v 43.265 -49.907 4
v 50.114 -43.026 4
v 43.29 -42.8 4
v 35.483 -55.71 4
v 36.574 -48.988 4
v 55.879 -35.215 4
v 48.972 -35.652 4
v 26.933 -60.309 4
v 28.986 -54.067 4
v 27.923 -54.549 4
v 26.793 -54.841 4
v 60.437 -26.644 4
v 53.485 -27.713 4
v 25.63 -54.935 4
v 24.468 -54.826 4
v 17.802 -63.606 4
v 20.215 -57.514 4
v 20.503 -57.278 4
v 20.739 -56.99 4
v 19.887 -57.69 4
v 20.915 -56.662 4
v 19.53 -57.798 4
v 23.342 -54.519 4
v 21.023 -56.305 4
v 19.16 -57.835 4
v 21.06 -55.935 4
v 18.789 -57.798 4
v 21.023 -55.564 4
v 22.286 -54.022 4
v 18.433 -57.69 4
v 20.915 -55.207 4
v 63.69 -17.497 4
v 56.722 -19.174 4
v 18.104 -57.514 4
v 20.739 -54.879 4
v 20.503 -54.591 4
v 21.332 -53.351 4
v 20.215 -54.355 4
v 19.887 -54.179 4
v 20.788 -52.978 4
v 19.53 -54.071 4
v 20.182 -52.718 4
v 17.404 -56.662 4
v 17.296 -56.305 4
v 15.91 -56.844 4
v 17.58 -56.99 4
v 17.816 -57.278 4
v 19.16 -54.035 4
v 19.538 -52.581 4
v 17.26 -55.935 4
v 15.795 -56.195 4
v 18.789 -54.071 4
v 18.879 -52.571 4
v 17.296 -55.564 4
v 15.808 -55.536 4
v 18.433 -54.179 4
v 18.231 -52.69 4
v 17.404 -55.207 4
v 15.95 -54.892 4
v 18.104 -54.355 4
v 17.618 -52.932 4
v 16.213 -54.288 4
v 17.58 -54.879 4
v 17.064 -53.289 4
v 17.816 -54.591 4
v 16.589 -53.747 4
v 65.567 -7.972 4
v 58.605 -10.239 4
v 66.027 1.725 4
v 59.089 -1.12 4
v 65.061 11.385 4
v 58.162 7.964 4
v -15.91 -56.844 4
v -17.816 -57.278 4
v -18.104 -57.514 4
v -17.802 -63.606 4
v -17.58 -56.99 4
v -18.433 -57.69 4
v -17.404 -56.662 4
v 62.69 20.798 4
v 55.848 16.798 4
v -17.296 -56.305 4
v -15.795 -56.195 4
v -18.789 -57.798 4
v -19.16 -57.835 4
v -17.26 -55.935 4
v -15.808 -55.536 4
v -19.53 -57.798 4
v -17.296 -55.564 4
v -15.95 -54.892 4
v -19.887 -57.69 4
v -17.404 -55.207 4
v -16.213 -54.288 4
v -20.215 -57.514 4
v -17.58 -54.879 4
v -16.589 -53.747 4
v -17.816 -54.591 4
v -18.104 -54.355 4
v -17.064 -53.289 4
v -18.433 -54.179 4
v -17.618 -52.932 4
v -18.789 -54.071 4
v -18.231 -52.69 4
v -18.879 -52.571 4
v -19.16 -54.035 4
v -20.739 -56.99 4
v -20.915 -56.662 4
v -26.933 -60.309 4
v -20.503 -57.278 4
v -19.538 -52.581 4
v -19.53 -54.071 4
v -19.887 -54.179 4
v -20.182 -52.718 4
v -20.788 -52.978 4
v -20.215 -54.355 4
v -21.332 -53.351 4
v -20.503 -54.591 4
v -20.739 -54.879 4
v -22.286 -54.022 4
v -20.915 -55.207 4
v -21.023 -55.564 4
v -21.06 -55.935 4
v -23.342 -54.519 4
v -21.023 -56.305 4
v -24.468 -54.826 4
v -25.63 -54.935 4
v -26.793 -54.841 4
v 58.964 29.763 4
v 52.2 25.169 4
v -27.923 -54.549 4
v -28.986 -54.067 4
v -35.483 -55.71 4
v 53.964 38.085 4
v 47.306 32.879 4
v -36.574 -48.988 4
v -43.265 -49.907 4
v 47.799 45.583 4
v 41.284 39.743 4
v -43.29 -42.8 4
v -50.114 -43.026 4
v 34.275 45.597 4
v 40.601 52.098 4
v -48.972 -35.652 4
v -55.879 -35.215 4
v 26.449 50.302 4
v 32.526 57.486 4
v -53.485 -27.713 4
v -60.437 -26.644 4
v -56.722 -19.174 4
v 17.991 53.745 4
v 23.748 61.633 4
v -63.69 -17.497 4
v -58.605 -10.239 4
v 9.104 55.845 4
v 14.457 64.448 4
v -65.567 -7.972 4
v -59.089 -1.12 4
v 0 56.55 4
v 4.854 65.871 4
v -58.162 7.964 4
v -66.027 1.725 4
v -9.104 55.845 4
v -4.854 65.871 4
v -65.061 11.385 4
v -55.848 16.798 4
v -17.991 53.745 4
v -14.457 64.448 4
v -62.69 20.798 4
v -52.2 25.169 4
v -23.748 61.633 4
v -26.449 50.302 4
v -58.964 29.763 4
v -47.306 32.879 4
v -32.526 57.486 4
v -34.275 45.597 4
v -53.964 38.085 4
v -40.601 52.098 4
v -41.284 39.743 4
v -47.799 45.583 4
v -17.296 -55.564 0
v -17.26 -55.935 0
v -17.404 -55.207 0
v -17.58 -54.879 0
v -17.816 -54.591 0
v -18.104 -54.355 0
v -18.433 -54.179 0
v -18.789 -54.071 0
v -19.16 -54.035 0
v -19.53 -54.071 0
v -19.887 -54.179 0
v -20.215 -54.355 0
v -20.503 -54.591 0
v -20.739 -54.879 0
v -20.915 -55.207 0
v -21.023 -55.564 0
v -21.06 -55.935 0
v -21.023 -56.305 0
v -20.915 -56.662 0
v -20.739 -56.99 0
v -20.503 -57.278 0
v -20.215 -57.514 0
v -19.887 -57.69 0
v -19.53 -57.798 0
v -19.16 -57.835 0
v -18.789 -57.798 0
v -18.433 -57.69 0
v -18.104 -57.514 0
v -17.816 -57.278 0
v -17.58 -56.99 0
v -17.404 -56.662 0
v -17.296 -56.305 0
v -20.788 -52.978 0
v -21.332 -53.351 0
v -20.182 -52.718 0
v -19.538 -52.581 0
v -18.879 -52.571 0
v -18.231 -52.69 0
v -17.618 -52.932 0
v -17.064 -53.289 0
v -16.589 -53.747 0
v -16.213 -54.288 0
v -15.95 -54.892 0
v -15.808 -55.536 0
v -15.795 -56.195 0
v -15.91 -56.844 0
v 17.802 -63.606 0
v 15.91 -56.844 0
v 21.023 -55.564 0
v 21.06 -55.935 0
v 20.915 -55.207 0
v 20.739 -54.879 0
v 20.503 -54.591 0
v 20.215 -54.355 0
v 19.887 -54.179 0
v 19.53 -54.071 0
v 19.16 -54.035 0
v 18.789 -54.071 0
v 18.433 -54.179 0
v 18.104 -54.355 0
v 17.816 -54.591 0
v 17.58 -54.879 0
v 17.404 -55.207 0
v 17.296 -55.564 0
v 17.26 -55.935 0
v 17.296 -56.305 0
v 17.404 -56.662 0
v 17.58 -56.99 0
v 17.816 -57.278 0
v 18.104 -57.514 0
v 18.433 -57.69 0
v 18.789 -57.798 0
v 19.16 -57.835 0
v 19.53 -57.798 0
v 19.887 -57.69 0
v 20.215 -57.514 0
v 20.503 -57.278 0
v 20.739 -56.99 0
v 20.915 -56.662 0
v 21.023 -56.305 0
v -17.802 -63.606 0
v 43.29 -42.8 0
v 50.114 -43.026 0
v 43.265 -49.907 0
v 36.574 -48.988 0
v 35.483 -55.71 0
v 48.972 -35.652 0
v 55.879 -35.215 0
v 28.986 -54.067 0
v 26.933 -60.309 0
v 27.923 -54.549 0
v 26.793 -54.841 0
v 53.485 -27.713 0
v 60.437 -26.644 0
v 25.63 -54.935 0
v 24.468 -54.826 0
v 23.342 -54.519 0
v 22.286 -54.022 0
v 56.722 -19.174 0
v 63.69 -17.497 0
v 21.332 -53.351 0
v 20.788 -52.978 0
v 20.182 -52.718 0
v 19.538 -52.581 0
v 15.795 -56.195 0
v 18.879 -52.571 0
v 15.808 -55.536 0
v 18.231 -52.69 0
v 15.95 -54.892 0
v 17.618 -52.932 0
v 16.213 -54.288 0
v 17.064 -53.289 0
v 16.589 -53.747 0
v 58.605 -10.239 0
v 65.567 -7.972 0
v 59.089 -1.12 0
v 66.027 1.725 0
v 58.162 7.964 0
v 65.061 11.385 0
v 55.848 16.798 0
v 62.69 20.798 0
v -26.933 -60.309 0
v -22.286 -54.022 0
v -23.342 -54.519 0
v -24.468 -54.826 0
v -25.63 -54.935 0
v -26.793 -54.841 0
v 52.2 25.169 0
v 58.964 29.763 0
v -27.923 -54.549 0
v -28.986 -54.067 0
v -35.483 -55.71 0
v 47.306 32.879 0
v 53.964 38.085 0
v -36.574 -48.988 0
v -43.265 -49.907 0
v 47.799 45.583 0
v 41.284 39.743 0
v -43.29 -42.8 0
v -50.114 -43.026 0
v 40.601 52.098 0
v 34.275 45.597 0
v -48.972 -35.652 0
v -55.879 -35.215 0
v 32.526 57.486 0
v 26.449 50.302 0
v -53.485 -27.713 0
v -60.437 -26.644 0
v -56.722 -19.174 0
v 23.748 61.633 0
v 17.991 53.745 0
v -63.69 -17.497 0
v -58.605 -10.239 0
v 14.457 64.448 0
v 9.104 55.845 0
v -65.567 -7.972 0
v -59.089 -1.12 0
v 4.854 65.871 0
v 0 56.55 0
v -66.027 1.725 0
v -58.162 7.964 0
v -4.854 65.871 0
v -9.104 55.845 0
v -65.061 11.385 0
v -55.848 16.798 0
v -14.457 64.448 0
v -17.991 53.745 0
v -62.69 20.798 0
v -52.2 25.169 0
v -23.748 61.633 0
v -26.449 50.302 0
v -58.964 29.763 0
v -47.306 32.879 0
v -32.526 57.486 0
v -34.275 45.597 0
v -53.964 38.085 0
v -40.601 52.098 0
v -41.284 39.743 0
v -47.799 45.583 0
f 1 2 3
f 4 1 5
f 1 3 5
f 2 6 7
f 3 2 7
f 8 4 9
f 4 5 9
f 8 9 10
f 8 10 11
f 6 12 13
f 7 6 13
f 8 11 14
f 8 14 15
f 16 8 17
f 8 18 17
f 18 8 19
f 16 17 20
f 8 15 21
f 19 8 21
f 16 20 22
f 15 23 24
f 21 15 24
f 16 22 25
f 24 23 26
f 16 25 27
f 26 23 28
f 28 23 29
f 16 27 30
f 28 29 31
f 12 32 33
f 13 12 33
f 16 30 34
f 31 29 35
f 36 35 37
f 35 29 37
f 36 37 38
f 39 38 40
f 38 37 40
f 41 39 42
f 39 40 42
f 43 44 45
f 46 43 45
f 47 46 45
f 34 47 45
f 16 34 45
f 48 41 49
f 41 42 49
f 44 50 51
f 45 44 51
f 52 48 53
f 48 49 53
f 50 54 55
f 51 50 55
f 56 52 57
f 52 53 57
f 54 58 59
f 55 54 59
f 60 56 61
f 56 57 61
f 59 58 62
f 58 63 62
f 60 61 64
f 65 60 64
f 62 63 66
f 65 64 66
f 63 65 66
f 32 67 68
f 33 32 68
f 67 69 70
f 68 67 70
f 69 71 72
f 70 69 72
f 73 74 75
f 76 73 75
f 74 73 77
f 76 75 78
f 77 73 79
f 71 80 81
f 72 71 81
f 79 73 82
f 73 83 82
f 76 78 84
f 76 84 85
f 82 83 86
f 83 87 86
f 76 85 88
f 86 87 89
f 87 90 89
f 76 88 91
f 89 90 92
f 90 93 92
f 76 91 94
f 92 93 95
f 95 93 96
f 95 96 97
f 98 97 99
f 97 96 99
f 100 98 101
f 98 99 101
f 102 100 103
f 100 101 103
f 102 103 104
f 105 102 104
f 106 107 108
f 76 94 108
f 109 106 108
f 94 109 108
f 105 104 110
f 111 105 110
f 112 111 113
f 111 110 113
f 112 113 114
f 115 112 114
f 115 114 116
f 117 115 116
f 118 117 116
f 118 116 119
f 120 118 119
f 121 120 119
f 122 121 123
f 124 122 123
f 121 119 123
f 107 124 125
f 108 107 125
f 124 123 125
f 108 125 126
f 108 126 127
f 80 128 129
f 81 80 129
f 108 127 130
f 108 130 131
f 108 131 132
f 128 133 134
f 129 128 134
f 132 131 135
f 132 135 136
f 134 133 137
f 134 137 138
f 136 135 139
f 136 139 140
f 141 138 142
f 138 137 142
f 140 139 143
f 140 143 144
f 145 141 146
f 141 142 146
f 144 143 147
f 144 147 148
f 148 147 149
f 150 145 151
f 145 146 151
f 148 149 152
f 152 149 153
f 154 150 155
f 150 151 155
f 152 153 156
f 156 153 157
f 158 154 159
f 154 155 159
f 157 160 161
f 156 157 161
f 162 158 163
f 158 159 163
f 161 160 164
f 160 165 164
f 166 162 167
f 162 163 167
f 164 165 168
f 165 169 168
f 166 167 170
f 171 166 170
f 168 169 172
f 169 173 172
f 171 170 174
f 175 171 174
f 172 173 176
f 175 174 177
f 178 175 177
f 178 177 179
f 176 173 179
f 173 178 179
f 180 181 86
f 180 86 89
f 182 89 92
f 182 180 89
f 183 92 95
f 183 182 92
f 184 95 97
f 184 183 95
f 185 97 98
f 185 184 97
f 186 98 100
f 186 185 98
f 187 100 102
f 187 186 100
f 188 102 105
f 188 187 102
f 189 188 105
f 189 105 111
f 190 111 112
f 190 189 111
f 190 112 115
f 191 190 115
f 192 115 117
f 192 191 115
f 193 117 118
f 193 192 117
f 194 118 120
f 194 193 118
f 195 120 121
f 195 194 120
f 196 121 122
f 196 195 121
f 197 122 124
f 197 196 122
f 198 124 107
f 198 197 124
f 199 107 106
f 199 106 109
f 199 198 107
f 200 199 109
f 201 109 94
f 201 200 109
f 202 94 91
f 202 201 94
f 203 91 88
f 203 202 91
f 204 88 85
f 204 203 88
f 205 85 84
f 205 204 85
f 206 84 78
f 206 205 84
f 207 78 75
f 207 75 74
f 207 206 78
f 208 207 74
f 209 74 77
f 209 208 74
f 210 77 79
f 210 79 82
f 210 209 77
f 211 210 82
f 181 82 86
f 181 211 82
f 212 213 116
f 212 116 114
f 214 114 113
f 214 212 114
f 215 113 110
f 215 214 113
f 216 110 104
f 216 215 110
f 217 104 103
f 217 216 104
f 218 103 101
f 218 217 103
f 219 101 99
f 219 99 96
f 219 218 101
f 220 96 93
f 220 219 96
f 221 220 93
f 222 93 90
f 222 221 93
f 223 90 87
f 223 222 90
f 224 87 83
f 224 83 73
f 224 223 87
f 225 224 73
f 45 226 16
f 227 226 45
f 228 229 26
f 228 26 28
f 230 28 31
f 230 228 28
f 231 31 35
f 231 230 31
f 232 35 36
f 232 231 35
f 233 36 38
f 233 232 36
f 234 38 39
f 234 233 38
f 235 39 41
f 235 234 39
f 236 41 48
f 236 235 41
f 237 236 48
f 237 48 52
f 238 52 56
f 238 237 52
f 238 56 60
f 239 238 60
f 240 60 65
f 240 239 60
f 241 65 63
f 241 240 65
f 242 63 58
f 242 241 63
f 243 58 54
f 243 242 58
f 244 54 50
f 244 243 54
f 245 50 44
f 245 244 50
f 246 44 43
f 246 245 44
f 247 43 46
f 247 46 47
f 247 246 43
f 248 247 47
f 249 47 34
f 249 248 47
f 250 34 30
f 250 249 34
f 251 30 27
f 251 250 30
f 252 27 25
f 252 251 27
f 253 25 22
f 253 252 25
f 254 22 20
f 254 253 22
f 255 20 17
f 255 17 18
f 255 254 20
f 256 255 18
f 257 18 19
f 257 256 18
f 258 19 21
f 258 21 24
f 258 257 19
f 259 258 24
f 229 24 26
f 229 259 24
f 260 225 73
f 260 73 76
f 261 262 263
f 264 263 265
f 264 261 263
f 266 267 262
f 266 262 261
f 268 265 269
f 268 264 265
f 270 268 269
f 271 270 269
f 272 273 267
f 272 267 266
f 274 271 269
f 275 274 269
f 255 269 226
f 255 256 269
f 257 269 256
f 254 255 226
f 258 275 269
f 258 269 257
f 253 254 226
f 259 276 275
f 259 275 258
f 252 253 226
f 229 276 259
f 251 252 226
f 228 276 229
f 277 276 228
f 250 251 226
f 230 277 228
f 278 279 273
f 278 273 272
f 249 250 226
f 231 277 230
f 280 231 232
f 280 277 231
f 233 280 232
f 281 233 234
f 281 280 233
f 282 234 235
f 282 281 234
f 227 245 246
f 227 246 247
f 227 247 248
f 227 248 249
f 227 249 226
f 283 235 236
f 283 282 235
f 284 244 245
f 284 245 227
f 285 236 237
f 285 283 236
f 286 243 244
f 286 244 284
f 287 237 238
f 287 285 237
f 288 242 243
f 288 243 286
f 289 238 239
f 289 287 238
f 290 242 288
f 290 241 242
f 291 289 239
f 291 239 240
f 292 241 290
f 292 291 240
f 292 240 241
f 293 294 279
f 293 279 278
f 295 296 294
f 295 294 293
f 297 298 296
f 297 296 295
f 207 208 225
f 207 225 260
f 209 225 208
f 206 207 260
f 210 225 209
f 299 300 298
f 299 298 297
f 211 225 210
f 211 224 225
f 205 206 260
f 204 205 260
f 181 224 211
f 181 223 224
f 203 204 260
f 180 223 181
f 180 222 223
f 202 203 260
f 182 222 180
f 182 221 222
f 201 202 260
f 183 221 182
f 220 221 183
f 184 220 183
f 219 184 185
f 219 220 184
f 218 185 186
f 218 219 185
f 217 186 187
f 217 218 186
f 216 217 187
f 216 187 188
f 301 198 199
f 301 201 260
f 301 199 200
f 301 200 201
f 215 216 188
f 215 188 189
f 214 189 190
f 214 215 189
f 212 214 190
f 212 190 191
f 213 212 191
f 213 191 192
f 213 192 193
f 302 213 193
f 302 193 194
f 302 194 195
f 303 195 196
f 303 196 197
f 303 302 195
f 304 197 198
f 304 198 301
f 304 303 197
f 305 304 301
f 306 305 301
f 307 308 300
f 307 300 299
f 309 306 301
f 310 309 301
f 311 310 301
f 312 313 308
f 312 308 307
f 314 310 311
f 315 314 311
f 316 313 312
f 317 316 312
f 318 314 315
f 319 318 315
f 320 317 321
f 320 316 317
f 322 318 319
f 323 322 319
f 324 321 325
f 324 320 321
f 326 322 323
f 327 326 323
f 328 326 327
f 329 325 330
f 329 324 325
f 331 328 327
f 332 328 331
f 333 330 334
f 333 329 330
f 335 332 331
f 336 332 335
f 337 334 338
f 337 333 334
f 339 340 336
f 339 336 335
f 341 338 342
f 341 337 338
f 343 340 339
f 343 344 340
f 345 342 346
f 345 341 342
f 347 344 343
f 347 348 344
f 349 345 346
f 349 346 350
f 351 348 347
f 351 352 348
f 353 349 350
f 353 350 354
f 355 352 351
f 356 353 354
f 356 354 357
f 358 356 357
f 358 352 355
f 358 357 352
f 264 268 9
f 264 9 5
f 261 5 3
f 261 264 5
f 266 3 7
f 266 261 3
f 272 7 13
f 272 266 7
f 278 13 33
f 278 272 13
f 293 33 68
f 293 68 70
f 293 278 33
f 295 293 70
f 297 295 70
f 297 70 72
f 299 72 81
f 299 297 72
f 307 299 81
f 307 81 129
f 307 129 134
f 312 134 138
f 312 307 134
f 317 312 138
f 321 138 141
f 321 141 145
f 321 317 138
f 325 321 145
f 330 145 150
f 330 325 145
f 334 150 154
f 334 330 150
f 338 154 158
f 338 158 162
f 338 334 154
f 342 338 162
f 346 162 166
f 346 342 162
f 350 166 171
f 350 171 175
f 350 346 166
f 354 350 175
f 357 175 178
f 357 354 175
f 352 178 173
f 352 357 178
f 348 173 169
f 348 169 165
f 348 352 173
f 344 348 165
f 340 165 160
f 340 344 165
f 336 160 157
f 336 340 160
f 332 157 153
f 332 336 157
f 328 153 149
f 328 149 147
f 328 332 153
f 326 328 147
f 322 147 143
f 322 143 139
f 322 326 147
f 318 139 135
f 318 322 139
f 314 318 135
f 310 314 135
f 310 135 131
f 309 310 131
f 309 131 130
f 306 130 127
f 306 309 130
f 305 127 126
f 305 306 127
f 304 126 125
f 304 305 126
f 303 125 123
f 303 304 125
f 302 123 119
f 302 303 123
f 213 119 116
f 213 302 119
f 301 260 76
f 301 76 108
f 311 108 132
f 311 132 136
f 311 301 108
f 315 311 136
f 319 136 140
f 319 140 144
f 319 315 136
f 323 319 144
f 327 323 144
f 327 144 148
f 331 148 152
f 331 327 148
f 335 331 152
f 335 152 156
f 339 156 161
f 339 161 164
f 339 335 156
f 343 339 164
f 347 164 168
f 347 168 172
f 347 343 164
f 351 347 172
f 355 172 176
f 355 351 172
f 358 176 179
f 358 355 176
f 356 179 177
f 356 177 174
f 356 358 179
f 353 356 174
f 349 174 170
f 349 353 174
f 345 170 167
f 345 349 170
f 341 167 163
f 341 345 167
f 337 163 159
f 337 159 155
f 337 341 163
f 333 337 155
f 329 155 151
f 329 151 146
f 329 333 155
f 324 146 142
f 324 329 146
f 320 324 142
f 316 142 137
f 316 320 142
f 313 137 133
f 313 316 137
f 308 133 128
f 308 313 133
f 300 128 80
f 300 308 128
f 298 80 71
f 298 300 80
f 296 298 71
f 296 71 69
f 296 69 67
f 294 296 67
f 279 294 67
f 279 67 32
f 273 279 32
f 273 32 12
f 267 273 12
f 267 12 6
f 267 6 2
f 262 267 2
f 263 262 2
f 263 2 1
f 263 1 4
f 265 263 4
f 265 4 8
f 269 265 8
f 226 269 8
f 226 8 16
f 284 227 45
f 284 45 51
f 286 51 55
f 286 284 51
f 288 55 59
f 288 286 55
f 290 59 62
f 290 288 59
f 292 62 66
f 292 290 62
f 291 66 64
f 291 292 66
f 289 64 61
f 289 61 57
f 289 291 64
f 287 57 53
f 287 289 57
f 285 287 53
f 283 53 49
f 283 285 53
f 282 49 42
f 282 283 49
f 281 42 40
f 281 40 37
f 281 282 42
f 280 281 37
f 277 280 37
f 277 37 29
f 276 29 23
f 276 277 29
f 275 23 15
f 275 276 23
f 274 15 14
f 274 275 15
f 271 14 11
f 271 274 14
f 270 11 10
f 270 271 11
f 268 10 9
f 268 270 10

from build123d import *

# Parameters (mm, degrees)
SKETCH1_R           = 1.9
BOSS_EXTRUDE1_DEPTH = 4


with BuildPart() as part:
    # Sketch1 → Boss-Extrude1 (new body)
    with BuildSketch(Plane.XY):
        with BuildLine():
            Line((17.801991214, -63.605751381), (15.909561323, -56.844180516))
            ThreePointArc((15.909561323, -56.844180516), (17.331888256, -53.097314134), (21.331580773, -53.351245934))
            ThreePointArc((21.331580773, -53.351245934), (25.046699576, -54.90531314), (28.9855978, -54.067271739))
            ThreePointArc((28.9855978, -54.067271739), (0, 56.55), (-28.9855978, -54.067271739))
            ThreePointArc((-28.9855978, -54.067271739), (-25.046699576, -54.90531314), (-21.331580773, -53.351245934))
            ThreePointArc((-21.331580773, -53.351245934), (-17.331888256, -53.097314134), (-15.909561323, -56.844180516))
            Line((-15.909561323, -56.844180516), (-17.801991214, -63.605751381))
            ThreePointArc((-17.801991214, -63.605751381), (0, 66.05), (17.801991214, -63.605751381))
        make_face()
        with Locations((19.159665955, -55.934540541)):
            Circle(SKETCH1_R, mode=Mode.SUBTRACT)
        with Locations((-19.159665955, -55.934540541)):
            Circle(SKETCH1_R, mode=Mode.SUBTRACT)
    extrude(amount=BOSS_EXTRUDE1_DEPTH)


solid = part.part
